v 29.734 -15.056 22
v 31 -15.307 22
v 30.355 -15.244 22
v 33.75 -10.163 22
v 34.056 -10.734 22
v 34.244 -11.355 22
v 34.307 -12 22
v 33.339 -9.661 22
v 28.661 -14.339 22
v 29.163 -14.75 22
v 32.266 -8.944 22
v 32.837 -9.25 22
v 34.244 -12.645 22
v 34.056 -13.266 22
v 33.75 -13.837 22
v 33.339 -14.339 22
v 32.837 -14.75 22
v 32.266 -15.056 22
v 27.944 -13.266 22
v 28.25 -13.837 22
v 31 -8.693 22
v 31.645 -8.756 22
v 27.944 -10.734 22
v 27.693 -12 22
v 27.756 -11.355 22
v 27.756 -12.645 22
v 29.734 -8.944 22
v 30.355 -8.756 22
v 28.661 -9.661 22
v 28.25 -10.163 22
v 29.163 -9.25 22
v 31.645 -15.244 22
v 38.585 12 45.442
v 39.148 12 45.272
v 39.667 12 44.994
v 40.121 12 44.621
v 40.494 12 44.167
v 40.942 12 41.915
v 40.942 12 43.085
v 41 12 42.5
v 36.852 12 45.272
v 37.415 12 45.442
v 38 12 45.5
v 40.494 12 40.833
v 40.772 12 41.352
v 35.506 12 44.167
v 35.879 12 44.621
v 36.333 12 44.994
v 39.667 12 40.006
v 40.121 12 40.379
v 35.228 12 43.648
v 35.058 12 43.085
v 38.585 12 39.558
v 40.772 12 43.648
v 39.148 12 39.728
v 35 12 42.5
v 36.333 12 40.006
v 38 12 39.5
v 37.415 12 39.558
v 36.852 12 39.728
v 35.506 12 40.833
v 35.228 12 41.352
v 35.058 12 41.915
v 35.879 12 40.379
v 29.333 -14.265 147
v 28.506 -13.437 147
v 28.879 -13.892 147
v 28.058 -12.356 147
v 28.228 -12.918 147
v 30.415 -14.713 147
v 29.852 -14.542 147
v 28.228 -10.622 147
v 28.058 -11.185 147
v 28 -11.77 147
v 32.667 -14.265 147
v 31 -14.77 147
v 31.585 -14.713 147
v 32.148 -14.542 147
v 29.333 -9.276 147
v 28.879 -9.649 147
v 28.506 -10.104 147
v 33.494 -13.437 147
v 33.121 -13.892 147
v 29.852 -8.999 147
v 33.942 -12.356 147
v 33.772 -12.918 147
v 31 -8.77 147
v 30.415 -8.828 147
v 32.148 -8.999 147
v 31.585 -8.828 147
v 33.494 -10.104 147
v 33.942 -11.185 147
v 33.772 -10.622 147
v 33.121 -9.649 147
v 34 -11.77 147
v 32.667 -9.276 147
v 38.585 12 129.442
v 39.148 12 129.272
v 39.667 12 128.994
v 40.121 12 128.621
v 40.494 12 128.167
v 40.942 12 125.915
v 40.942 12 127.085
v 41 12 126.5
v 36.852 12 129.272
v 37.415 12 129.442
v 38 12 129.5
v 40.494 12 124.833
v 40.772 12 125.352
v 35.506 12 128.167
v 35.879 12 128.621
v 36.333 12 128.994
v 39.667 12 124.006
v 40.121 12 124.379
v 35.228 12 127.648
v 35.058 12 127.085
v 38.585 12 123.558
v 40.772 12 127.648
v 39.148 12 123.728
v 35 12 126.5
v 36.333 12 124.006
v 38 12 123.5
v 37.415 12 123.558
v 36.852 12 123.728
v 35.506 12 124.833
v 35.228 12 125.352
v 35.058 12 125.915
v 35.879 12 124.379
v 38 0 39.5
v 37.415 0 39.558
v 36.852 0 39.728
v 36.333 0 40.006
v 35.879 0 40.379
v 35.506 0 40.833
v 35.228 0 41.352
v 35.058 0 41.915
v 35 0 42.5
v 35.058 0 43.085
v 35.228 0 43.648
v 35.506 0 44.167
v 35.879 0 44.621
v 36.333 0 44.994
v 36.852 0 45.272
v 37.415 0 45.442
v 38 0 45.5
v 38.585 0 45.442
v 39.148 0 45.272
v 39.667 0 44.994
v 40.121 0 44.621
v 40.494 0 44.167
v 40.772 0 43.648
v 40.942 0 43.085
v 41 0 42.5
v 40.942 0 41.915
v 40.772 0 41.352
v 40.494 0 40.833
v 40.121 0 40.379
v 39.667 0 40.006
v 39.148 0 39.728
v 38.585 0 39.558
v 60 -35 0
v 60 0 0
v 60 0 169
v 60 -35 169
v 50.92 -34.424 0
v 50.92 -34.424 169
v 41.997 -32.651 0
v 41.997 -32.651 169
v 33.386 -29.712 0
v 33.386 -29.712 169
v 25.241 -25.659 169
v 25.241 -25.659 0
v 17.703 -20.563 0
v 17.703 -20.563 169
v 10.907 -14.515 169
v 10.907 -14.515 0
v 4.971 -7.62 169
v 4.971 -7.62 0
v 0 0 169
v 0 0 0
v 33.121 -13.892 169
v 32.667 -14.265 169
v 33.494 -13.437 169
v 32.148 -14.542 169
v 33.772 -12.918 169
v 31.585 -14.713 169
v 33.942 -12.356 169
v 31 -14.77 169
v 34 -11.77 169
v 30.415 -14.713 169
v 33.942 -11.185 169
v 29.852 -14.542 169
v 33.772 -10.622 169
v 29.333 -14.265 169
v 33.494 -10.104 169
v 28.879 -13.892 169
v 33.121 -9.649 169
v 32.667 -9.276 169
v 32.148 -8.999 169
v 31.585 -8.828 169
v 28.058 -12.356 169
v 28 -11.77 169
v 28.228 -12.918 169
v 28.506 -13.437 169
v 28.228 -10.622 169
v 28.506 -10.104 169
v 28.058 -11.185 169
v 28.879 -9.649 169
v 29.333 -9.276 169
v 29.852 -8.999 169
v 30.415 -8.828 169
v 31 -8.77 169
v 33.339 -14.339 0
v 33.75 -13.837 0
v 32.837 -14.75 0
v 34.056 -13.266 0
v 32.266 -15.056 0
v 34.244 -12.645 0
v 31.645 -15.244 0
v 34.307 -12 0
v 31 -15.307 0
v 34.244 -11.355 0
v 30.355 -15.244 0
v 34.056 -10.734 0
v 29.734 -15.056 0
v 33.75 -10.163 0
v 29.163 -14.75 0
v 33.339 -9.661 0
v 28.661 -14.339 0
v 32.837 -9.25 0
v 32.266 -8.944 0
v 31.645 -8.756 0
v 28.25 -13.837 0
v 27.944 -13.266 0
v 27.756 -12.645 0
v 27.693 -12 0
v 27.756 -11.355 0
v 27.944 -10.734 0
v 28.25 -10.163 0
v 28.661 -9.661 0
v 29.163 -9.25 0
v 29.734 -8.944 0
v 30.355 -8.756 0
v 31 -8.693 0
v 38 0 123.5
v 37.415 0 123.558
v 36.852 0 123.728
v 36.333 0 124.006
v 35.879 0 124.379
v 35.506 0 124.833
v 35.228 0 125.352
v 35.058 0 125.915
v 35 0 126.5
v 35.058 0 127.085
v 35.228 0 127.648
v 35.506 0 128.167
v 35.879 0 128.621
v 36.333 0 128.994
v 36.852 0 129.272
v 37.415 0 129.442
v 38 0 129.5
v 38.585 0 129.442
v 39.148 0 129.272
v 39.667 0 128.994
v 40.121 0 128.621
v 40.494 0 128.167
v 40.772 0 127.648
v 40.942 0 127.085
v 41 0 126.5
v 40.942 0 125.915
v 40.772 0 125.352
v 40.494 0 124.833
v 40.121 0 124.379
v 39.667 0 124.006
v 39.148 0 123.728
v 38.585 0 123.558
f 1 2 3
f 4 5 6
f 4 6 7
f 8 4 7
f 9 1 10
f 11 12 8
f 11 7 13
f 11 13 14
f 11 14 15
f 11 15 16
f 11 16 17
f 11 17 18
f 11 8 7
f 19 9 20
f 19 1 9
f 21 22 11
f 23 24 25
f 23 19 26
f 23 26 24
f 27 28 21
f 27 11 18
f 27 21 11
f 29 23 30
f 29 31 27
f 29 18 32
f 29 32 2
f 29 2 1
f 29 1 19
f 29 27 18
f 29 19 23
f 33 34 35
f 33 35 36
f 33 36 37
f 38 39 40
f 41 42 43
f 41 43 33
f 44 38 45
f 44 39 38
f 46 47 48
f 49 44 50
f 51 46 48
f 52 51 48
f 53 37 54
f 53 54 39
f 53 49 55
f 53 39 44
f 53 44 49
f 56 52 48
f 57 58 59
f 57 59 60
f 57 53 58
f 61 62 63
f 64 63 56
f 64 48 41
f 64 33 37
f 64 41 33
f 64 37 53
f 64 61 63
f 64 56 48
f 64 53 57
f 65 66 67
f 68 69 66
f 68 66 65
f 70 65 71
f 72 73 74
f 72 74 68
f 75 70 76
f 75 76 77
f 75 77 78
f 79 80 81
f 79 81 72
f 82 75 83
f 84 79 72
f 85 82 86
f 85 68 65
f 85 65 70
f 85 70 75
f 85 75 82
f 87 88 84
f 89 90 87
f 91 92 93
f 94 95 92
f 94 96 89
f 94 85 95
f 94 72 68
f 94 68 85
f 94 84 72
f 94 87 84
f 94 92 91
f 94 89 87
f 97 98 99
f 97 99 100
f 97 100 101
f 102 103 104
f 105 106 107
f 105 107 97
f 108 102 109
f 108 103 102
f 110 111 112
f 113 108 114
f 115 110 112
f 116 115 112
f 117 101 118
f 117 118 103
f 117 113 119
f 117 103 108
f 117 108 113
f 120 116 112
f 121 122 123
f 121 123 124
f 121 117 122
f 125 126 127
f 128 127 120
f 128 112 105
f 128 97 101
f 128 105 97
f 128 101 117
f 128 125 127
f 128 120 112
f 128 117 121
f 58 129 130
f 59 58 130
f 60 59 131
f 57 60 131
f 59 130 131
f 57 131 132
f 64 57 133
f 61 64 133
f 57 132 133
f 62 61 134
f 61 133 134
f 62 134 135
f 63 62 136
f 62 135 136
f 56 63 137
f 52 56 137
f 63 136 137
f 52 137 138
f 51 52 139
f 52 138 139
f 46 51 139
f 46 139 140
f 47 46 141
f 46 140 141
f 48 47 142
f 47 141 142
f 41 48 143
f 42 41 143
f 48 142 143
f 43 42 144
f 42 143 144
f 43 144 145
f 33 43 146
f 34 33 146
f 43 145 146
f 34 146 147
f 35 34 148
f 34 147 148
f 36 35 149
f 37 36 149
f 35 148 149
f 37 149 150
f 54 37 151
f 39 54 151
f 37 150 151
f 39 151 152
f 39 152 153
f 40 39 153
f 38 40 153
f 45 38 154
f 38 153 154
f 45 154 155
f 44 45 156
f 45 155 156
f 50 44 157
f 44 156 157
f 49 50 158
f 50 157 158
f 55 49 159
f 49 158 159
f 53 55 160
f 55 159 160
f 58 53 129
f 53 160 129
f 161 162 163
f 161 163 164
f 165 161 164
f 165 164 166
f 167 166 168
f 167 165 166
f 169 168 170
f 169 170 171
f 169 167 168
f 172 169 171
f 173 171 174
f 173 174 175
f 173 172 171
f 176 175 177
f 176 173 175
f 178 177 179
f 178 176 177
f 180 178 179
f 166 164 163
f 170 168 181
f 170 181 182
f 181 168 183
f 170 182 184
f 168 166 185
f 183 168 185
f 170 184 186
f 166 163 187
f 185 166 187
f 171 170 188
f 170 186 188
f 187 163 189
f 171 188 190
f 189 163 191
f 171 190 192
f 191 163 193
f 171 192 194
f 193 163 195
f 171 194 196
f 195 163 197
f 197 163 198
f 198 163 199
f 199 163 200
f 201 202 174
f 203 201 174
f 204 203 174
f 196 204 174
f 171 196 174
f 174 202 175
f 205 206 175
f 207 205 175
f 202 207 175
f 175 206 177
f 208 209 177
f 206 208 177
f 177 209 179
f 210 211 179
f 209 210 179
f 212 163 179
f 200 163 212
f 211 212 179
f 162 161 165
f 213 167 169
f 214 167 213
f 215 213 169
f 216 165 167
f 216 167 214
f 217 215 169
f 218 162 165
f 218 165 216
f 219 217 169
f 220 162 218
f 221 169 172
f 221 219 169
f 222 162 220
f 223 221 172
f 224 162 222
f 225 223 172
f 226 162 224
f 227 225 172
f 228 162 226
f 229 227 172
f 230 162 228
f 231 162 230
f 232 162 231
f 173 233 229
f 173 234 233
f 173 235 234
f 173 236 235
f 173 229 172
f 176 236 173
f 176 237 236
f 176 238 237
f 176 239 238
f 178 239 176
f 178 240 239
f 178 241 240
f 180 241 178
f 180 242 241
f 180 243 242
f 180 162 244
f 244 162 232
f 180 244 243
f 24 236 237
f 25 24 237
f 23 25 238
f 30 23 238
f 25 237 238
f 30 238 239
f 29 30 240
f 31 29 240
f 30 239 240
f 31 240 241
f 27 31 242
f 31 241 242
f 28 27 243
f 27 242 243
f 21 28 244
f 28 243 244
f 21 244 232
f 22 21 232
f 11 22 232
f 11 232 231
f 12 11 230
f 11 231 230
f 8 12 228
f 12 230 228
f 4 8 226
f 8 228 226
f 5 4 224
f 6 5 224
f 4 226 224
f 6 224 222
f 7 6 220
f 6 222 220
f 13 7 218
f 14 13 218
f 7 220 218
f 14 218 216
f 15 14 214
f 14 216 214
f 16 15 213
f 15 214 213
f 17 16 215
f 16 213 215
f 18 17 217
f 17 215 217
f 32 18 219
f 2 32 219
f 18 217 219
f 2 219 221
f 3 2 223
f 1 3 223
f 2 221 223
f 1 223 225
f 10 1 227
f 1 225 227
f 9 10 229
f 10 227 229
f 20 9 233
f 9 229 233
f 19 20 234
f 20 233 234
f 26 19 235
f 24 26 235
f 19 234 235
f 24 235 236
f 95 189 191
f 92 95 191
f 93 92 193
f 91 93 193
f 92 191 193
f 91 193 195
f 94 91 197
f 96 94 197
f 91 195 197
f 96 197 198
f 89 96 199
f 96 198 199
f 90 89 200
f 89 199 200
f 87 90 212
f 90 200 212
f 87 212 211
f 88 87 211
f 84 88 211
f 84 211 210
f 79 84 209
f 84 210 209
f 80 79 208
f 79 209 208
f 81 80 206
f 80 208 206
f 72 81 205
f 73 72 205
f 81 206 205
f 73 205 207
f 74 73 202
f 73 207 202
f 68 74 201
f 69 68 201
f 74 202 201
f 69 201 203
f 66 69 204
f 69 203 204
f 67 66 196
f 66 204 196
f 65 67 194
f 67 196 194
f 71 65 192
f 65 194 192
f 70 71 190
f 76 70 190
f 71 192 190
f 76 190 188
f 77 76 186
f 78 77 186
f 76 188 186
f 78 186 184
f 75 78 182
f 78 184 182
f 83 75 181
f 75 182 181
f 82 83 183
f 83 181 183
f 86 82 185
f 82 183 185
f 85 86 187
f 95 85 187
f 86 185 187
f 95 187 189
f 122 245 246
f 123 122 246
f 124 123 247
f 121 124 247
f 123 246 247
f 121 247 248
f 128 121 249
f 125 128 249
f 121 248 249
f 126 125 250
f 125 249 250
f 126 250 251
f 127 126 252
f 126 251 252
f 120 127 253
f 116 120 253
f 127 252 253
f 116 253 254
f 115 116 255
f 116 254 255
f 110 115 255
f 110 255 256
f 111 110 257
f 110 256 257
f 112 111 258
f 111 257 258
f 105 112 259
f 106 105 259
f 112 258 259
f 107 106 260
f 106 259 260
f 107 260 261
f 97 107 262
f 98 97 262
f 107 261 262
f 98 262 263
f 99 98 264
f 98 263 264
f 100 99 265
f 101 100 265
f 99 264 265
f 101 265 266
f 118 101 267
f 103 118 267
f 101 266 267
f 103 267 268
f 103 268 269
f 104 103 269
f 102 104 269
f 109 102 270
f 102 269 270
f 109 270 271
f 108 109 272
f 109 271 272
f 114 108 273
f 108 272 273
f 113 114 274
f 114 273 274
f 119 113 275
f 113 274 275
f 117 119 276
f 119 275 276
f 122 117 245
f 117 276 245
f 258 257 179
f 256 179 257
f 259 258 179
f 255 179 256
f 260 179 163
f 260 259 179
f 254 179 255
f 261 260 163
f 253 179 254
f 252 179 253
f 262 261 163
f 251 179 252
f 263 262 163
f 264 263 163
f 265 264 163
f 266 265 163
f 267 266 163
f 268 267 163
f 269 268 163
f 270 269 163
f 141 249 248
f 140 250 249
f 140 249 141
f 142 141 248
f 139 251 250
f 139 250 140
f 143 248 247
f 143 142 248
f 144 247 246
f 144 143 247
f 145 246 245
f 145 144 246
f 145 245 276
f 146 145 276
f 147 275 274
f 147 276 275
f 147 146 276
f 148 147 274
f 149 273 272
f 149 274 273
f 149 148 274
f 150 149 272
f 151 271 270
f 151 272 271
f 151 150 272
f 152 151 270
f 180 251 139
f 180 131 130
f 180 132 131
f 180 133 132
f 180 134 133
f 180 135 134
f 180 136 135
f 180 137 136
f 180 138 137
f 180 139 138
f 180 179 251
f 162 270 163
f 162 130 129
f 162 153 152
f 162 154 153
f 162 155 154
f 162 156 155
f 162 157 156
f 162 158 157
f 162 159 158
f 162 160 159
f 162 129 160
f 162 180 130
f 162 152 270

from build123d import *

# Parameters (mm, degrees)
BOSS_EXTRU_1_DEPTH      = 169
ESQUISSE2_R             = 3.307300662
ENL_V_MAT_EXTRU_1_DEPTH = 22
ESQUISSE3_R             = 3
BOSS_EXTRU_3_DEPTH      = 12
ESQUISSE4_R             = 3
BOSS_EXTRU_4_DEPTH      = 12
ESQUISSE5_R             = 3
ENL_V_MAT_EXTRU_2_DEPTH = 22


with BuildPart() as part:
    # Esquisse1 → Boss.-Extru.1 (new body)
    with BuildSketch(Plane.XY):
        with BuildLine():
            Line((0, 0), (60, 0))
            Line((60, 0), (60, -35))
            ThreePointArc((60, -35), (25.240598959, -25.658973212), (0, 0))
        make_face()
    extrude(amount=BOSS_EXTRU_1_DEPTH)

    # Esquisse2 → Enlèv. mat.-Extru.1 (cut)
    with BuildSketch(Plane(origin=(0, 0, 0), x_dir=(-1, 0, 0), z_dir=(0, 0, -1))):
        with Locations((-31, -12)):
            Circle(ESQUISSE2_R)
    extrude(amount=-ENL_V_MAT_EXTRU_1_DEPTH, mode=Mode.SUBTRACT)

    # Esquisse3 → Boss.-Extru.3 (add)
    with BuildSketch(Plane(origin=(0, 0, 0), x_dir=(1, 0, 0), z_dir=(0, 1, 0))):
        with Locations(Location((38, -42.5, 0), (0, 0, 90))):
            Circle(ESQUISSE3_R)
    extrude(amount=BOSS_EXTRU_3_DEPTH)

    # Esquisse4 → Boss.-Extru.4 (add)
    with BuildSketch(Plane(origin=(0, 0, 0), x_dir=(1, 0, 0), z_dir=(0, 1, 0))):
        with Locations(Location((38, -126.5, 0), (0, 0, 90))):
            Circle(ESQUISSE4_R)
    extrude(amount=BOSS_EXTRU_4_DEPTH)

    # Esquisse5 → Enlèv. mat.-Extru.2 (cut)
    with BuildSketch(Plane.XY.offset(169)):
        with Locations((31, -11.770310322)):
            Circle(ESQUISSE5_R)
    extrude(amount=-ENL_V_MAT_EXTRU_2_DEPTH, mode=Mode.SUBTRACT)


solid = part.part
